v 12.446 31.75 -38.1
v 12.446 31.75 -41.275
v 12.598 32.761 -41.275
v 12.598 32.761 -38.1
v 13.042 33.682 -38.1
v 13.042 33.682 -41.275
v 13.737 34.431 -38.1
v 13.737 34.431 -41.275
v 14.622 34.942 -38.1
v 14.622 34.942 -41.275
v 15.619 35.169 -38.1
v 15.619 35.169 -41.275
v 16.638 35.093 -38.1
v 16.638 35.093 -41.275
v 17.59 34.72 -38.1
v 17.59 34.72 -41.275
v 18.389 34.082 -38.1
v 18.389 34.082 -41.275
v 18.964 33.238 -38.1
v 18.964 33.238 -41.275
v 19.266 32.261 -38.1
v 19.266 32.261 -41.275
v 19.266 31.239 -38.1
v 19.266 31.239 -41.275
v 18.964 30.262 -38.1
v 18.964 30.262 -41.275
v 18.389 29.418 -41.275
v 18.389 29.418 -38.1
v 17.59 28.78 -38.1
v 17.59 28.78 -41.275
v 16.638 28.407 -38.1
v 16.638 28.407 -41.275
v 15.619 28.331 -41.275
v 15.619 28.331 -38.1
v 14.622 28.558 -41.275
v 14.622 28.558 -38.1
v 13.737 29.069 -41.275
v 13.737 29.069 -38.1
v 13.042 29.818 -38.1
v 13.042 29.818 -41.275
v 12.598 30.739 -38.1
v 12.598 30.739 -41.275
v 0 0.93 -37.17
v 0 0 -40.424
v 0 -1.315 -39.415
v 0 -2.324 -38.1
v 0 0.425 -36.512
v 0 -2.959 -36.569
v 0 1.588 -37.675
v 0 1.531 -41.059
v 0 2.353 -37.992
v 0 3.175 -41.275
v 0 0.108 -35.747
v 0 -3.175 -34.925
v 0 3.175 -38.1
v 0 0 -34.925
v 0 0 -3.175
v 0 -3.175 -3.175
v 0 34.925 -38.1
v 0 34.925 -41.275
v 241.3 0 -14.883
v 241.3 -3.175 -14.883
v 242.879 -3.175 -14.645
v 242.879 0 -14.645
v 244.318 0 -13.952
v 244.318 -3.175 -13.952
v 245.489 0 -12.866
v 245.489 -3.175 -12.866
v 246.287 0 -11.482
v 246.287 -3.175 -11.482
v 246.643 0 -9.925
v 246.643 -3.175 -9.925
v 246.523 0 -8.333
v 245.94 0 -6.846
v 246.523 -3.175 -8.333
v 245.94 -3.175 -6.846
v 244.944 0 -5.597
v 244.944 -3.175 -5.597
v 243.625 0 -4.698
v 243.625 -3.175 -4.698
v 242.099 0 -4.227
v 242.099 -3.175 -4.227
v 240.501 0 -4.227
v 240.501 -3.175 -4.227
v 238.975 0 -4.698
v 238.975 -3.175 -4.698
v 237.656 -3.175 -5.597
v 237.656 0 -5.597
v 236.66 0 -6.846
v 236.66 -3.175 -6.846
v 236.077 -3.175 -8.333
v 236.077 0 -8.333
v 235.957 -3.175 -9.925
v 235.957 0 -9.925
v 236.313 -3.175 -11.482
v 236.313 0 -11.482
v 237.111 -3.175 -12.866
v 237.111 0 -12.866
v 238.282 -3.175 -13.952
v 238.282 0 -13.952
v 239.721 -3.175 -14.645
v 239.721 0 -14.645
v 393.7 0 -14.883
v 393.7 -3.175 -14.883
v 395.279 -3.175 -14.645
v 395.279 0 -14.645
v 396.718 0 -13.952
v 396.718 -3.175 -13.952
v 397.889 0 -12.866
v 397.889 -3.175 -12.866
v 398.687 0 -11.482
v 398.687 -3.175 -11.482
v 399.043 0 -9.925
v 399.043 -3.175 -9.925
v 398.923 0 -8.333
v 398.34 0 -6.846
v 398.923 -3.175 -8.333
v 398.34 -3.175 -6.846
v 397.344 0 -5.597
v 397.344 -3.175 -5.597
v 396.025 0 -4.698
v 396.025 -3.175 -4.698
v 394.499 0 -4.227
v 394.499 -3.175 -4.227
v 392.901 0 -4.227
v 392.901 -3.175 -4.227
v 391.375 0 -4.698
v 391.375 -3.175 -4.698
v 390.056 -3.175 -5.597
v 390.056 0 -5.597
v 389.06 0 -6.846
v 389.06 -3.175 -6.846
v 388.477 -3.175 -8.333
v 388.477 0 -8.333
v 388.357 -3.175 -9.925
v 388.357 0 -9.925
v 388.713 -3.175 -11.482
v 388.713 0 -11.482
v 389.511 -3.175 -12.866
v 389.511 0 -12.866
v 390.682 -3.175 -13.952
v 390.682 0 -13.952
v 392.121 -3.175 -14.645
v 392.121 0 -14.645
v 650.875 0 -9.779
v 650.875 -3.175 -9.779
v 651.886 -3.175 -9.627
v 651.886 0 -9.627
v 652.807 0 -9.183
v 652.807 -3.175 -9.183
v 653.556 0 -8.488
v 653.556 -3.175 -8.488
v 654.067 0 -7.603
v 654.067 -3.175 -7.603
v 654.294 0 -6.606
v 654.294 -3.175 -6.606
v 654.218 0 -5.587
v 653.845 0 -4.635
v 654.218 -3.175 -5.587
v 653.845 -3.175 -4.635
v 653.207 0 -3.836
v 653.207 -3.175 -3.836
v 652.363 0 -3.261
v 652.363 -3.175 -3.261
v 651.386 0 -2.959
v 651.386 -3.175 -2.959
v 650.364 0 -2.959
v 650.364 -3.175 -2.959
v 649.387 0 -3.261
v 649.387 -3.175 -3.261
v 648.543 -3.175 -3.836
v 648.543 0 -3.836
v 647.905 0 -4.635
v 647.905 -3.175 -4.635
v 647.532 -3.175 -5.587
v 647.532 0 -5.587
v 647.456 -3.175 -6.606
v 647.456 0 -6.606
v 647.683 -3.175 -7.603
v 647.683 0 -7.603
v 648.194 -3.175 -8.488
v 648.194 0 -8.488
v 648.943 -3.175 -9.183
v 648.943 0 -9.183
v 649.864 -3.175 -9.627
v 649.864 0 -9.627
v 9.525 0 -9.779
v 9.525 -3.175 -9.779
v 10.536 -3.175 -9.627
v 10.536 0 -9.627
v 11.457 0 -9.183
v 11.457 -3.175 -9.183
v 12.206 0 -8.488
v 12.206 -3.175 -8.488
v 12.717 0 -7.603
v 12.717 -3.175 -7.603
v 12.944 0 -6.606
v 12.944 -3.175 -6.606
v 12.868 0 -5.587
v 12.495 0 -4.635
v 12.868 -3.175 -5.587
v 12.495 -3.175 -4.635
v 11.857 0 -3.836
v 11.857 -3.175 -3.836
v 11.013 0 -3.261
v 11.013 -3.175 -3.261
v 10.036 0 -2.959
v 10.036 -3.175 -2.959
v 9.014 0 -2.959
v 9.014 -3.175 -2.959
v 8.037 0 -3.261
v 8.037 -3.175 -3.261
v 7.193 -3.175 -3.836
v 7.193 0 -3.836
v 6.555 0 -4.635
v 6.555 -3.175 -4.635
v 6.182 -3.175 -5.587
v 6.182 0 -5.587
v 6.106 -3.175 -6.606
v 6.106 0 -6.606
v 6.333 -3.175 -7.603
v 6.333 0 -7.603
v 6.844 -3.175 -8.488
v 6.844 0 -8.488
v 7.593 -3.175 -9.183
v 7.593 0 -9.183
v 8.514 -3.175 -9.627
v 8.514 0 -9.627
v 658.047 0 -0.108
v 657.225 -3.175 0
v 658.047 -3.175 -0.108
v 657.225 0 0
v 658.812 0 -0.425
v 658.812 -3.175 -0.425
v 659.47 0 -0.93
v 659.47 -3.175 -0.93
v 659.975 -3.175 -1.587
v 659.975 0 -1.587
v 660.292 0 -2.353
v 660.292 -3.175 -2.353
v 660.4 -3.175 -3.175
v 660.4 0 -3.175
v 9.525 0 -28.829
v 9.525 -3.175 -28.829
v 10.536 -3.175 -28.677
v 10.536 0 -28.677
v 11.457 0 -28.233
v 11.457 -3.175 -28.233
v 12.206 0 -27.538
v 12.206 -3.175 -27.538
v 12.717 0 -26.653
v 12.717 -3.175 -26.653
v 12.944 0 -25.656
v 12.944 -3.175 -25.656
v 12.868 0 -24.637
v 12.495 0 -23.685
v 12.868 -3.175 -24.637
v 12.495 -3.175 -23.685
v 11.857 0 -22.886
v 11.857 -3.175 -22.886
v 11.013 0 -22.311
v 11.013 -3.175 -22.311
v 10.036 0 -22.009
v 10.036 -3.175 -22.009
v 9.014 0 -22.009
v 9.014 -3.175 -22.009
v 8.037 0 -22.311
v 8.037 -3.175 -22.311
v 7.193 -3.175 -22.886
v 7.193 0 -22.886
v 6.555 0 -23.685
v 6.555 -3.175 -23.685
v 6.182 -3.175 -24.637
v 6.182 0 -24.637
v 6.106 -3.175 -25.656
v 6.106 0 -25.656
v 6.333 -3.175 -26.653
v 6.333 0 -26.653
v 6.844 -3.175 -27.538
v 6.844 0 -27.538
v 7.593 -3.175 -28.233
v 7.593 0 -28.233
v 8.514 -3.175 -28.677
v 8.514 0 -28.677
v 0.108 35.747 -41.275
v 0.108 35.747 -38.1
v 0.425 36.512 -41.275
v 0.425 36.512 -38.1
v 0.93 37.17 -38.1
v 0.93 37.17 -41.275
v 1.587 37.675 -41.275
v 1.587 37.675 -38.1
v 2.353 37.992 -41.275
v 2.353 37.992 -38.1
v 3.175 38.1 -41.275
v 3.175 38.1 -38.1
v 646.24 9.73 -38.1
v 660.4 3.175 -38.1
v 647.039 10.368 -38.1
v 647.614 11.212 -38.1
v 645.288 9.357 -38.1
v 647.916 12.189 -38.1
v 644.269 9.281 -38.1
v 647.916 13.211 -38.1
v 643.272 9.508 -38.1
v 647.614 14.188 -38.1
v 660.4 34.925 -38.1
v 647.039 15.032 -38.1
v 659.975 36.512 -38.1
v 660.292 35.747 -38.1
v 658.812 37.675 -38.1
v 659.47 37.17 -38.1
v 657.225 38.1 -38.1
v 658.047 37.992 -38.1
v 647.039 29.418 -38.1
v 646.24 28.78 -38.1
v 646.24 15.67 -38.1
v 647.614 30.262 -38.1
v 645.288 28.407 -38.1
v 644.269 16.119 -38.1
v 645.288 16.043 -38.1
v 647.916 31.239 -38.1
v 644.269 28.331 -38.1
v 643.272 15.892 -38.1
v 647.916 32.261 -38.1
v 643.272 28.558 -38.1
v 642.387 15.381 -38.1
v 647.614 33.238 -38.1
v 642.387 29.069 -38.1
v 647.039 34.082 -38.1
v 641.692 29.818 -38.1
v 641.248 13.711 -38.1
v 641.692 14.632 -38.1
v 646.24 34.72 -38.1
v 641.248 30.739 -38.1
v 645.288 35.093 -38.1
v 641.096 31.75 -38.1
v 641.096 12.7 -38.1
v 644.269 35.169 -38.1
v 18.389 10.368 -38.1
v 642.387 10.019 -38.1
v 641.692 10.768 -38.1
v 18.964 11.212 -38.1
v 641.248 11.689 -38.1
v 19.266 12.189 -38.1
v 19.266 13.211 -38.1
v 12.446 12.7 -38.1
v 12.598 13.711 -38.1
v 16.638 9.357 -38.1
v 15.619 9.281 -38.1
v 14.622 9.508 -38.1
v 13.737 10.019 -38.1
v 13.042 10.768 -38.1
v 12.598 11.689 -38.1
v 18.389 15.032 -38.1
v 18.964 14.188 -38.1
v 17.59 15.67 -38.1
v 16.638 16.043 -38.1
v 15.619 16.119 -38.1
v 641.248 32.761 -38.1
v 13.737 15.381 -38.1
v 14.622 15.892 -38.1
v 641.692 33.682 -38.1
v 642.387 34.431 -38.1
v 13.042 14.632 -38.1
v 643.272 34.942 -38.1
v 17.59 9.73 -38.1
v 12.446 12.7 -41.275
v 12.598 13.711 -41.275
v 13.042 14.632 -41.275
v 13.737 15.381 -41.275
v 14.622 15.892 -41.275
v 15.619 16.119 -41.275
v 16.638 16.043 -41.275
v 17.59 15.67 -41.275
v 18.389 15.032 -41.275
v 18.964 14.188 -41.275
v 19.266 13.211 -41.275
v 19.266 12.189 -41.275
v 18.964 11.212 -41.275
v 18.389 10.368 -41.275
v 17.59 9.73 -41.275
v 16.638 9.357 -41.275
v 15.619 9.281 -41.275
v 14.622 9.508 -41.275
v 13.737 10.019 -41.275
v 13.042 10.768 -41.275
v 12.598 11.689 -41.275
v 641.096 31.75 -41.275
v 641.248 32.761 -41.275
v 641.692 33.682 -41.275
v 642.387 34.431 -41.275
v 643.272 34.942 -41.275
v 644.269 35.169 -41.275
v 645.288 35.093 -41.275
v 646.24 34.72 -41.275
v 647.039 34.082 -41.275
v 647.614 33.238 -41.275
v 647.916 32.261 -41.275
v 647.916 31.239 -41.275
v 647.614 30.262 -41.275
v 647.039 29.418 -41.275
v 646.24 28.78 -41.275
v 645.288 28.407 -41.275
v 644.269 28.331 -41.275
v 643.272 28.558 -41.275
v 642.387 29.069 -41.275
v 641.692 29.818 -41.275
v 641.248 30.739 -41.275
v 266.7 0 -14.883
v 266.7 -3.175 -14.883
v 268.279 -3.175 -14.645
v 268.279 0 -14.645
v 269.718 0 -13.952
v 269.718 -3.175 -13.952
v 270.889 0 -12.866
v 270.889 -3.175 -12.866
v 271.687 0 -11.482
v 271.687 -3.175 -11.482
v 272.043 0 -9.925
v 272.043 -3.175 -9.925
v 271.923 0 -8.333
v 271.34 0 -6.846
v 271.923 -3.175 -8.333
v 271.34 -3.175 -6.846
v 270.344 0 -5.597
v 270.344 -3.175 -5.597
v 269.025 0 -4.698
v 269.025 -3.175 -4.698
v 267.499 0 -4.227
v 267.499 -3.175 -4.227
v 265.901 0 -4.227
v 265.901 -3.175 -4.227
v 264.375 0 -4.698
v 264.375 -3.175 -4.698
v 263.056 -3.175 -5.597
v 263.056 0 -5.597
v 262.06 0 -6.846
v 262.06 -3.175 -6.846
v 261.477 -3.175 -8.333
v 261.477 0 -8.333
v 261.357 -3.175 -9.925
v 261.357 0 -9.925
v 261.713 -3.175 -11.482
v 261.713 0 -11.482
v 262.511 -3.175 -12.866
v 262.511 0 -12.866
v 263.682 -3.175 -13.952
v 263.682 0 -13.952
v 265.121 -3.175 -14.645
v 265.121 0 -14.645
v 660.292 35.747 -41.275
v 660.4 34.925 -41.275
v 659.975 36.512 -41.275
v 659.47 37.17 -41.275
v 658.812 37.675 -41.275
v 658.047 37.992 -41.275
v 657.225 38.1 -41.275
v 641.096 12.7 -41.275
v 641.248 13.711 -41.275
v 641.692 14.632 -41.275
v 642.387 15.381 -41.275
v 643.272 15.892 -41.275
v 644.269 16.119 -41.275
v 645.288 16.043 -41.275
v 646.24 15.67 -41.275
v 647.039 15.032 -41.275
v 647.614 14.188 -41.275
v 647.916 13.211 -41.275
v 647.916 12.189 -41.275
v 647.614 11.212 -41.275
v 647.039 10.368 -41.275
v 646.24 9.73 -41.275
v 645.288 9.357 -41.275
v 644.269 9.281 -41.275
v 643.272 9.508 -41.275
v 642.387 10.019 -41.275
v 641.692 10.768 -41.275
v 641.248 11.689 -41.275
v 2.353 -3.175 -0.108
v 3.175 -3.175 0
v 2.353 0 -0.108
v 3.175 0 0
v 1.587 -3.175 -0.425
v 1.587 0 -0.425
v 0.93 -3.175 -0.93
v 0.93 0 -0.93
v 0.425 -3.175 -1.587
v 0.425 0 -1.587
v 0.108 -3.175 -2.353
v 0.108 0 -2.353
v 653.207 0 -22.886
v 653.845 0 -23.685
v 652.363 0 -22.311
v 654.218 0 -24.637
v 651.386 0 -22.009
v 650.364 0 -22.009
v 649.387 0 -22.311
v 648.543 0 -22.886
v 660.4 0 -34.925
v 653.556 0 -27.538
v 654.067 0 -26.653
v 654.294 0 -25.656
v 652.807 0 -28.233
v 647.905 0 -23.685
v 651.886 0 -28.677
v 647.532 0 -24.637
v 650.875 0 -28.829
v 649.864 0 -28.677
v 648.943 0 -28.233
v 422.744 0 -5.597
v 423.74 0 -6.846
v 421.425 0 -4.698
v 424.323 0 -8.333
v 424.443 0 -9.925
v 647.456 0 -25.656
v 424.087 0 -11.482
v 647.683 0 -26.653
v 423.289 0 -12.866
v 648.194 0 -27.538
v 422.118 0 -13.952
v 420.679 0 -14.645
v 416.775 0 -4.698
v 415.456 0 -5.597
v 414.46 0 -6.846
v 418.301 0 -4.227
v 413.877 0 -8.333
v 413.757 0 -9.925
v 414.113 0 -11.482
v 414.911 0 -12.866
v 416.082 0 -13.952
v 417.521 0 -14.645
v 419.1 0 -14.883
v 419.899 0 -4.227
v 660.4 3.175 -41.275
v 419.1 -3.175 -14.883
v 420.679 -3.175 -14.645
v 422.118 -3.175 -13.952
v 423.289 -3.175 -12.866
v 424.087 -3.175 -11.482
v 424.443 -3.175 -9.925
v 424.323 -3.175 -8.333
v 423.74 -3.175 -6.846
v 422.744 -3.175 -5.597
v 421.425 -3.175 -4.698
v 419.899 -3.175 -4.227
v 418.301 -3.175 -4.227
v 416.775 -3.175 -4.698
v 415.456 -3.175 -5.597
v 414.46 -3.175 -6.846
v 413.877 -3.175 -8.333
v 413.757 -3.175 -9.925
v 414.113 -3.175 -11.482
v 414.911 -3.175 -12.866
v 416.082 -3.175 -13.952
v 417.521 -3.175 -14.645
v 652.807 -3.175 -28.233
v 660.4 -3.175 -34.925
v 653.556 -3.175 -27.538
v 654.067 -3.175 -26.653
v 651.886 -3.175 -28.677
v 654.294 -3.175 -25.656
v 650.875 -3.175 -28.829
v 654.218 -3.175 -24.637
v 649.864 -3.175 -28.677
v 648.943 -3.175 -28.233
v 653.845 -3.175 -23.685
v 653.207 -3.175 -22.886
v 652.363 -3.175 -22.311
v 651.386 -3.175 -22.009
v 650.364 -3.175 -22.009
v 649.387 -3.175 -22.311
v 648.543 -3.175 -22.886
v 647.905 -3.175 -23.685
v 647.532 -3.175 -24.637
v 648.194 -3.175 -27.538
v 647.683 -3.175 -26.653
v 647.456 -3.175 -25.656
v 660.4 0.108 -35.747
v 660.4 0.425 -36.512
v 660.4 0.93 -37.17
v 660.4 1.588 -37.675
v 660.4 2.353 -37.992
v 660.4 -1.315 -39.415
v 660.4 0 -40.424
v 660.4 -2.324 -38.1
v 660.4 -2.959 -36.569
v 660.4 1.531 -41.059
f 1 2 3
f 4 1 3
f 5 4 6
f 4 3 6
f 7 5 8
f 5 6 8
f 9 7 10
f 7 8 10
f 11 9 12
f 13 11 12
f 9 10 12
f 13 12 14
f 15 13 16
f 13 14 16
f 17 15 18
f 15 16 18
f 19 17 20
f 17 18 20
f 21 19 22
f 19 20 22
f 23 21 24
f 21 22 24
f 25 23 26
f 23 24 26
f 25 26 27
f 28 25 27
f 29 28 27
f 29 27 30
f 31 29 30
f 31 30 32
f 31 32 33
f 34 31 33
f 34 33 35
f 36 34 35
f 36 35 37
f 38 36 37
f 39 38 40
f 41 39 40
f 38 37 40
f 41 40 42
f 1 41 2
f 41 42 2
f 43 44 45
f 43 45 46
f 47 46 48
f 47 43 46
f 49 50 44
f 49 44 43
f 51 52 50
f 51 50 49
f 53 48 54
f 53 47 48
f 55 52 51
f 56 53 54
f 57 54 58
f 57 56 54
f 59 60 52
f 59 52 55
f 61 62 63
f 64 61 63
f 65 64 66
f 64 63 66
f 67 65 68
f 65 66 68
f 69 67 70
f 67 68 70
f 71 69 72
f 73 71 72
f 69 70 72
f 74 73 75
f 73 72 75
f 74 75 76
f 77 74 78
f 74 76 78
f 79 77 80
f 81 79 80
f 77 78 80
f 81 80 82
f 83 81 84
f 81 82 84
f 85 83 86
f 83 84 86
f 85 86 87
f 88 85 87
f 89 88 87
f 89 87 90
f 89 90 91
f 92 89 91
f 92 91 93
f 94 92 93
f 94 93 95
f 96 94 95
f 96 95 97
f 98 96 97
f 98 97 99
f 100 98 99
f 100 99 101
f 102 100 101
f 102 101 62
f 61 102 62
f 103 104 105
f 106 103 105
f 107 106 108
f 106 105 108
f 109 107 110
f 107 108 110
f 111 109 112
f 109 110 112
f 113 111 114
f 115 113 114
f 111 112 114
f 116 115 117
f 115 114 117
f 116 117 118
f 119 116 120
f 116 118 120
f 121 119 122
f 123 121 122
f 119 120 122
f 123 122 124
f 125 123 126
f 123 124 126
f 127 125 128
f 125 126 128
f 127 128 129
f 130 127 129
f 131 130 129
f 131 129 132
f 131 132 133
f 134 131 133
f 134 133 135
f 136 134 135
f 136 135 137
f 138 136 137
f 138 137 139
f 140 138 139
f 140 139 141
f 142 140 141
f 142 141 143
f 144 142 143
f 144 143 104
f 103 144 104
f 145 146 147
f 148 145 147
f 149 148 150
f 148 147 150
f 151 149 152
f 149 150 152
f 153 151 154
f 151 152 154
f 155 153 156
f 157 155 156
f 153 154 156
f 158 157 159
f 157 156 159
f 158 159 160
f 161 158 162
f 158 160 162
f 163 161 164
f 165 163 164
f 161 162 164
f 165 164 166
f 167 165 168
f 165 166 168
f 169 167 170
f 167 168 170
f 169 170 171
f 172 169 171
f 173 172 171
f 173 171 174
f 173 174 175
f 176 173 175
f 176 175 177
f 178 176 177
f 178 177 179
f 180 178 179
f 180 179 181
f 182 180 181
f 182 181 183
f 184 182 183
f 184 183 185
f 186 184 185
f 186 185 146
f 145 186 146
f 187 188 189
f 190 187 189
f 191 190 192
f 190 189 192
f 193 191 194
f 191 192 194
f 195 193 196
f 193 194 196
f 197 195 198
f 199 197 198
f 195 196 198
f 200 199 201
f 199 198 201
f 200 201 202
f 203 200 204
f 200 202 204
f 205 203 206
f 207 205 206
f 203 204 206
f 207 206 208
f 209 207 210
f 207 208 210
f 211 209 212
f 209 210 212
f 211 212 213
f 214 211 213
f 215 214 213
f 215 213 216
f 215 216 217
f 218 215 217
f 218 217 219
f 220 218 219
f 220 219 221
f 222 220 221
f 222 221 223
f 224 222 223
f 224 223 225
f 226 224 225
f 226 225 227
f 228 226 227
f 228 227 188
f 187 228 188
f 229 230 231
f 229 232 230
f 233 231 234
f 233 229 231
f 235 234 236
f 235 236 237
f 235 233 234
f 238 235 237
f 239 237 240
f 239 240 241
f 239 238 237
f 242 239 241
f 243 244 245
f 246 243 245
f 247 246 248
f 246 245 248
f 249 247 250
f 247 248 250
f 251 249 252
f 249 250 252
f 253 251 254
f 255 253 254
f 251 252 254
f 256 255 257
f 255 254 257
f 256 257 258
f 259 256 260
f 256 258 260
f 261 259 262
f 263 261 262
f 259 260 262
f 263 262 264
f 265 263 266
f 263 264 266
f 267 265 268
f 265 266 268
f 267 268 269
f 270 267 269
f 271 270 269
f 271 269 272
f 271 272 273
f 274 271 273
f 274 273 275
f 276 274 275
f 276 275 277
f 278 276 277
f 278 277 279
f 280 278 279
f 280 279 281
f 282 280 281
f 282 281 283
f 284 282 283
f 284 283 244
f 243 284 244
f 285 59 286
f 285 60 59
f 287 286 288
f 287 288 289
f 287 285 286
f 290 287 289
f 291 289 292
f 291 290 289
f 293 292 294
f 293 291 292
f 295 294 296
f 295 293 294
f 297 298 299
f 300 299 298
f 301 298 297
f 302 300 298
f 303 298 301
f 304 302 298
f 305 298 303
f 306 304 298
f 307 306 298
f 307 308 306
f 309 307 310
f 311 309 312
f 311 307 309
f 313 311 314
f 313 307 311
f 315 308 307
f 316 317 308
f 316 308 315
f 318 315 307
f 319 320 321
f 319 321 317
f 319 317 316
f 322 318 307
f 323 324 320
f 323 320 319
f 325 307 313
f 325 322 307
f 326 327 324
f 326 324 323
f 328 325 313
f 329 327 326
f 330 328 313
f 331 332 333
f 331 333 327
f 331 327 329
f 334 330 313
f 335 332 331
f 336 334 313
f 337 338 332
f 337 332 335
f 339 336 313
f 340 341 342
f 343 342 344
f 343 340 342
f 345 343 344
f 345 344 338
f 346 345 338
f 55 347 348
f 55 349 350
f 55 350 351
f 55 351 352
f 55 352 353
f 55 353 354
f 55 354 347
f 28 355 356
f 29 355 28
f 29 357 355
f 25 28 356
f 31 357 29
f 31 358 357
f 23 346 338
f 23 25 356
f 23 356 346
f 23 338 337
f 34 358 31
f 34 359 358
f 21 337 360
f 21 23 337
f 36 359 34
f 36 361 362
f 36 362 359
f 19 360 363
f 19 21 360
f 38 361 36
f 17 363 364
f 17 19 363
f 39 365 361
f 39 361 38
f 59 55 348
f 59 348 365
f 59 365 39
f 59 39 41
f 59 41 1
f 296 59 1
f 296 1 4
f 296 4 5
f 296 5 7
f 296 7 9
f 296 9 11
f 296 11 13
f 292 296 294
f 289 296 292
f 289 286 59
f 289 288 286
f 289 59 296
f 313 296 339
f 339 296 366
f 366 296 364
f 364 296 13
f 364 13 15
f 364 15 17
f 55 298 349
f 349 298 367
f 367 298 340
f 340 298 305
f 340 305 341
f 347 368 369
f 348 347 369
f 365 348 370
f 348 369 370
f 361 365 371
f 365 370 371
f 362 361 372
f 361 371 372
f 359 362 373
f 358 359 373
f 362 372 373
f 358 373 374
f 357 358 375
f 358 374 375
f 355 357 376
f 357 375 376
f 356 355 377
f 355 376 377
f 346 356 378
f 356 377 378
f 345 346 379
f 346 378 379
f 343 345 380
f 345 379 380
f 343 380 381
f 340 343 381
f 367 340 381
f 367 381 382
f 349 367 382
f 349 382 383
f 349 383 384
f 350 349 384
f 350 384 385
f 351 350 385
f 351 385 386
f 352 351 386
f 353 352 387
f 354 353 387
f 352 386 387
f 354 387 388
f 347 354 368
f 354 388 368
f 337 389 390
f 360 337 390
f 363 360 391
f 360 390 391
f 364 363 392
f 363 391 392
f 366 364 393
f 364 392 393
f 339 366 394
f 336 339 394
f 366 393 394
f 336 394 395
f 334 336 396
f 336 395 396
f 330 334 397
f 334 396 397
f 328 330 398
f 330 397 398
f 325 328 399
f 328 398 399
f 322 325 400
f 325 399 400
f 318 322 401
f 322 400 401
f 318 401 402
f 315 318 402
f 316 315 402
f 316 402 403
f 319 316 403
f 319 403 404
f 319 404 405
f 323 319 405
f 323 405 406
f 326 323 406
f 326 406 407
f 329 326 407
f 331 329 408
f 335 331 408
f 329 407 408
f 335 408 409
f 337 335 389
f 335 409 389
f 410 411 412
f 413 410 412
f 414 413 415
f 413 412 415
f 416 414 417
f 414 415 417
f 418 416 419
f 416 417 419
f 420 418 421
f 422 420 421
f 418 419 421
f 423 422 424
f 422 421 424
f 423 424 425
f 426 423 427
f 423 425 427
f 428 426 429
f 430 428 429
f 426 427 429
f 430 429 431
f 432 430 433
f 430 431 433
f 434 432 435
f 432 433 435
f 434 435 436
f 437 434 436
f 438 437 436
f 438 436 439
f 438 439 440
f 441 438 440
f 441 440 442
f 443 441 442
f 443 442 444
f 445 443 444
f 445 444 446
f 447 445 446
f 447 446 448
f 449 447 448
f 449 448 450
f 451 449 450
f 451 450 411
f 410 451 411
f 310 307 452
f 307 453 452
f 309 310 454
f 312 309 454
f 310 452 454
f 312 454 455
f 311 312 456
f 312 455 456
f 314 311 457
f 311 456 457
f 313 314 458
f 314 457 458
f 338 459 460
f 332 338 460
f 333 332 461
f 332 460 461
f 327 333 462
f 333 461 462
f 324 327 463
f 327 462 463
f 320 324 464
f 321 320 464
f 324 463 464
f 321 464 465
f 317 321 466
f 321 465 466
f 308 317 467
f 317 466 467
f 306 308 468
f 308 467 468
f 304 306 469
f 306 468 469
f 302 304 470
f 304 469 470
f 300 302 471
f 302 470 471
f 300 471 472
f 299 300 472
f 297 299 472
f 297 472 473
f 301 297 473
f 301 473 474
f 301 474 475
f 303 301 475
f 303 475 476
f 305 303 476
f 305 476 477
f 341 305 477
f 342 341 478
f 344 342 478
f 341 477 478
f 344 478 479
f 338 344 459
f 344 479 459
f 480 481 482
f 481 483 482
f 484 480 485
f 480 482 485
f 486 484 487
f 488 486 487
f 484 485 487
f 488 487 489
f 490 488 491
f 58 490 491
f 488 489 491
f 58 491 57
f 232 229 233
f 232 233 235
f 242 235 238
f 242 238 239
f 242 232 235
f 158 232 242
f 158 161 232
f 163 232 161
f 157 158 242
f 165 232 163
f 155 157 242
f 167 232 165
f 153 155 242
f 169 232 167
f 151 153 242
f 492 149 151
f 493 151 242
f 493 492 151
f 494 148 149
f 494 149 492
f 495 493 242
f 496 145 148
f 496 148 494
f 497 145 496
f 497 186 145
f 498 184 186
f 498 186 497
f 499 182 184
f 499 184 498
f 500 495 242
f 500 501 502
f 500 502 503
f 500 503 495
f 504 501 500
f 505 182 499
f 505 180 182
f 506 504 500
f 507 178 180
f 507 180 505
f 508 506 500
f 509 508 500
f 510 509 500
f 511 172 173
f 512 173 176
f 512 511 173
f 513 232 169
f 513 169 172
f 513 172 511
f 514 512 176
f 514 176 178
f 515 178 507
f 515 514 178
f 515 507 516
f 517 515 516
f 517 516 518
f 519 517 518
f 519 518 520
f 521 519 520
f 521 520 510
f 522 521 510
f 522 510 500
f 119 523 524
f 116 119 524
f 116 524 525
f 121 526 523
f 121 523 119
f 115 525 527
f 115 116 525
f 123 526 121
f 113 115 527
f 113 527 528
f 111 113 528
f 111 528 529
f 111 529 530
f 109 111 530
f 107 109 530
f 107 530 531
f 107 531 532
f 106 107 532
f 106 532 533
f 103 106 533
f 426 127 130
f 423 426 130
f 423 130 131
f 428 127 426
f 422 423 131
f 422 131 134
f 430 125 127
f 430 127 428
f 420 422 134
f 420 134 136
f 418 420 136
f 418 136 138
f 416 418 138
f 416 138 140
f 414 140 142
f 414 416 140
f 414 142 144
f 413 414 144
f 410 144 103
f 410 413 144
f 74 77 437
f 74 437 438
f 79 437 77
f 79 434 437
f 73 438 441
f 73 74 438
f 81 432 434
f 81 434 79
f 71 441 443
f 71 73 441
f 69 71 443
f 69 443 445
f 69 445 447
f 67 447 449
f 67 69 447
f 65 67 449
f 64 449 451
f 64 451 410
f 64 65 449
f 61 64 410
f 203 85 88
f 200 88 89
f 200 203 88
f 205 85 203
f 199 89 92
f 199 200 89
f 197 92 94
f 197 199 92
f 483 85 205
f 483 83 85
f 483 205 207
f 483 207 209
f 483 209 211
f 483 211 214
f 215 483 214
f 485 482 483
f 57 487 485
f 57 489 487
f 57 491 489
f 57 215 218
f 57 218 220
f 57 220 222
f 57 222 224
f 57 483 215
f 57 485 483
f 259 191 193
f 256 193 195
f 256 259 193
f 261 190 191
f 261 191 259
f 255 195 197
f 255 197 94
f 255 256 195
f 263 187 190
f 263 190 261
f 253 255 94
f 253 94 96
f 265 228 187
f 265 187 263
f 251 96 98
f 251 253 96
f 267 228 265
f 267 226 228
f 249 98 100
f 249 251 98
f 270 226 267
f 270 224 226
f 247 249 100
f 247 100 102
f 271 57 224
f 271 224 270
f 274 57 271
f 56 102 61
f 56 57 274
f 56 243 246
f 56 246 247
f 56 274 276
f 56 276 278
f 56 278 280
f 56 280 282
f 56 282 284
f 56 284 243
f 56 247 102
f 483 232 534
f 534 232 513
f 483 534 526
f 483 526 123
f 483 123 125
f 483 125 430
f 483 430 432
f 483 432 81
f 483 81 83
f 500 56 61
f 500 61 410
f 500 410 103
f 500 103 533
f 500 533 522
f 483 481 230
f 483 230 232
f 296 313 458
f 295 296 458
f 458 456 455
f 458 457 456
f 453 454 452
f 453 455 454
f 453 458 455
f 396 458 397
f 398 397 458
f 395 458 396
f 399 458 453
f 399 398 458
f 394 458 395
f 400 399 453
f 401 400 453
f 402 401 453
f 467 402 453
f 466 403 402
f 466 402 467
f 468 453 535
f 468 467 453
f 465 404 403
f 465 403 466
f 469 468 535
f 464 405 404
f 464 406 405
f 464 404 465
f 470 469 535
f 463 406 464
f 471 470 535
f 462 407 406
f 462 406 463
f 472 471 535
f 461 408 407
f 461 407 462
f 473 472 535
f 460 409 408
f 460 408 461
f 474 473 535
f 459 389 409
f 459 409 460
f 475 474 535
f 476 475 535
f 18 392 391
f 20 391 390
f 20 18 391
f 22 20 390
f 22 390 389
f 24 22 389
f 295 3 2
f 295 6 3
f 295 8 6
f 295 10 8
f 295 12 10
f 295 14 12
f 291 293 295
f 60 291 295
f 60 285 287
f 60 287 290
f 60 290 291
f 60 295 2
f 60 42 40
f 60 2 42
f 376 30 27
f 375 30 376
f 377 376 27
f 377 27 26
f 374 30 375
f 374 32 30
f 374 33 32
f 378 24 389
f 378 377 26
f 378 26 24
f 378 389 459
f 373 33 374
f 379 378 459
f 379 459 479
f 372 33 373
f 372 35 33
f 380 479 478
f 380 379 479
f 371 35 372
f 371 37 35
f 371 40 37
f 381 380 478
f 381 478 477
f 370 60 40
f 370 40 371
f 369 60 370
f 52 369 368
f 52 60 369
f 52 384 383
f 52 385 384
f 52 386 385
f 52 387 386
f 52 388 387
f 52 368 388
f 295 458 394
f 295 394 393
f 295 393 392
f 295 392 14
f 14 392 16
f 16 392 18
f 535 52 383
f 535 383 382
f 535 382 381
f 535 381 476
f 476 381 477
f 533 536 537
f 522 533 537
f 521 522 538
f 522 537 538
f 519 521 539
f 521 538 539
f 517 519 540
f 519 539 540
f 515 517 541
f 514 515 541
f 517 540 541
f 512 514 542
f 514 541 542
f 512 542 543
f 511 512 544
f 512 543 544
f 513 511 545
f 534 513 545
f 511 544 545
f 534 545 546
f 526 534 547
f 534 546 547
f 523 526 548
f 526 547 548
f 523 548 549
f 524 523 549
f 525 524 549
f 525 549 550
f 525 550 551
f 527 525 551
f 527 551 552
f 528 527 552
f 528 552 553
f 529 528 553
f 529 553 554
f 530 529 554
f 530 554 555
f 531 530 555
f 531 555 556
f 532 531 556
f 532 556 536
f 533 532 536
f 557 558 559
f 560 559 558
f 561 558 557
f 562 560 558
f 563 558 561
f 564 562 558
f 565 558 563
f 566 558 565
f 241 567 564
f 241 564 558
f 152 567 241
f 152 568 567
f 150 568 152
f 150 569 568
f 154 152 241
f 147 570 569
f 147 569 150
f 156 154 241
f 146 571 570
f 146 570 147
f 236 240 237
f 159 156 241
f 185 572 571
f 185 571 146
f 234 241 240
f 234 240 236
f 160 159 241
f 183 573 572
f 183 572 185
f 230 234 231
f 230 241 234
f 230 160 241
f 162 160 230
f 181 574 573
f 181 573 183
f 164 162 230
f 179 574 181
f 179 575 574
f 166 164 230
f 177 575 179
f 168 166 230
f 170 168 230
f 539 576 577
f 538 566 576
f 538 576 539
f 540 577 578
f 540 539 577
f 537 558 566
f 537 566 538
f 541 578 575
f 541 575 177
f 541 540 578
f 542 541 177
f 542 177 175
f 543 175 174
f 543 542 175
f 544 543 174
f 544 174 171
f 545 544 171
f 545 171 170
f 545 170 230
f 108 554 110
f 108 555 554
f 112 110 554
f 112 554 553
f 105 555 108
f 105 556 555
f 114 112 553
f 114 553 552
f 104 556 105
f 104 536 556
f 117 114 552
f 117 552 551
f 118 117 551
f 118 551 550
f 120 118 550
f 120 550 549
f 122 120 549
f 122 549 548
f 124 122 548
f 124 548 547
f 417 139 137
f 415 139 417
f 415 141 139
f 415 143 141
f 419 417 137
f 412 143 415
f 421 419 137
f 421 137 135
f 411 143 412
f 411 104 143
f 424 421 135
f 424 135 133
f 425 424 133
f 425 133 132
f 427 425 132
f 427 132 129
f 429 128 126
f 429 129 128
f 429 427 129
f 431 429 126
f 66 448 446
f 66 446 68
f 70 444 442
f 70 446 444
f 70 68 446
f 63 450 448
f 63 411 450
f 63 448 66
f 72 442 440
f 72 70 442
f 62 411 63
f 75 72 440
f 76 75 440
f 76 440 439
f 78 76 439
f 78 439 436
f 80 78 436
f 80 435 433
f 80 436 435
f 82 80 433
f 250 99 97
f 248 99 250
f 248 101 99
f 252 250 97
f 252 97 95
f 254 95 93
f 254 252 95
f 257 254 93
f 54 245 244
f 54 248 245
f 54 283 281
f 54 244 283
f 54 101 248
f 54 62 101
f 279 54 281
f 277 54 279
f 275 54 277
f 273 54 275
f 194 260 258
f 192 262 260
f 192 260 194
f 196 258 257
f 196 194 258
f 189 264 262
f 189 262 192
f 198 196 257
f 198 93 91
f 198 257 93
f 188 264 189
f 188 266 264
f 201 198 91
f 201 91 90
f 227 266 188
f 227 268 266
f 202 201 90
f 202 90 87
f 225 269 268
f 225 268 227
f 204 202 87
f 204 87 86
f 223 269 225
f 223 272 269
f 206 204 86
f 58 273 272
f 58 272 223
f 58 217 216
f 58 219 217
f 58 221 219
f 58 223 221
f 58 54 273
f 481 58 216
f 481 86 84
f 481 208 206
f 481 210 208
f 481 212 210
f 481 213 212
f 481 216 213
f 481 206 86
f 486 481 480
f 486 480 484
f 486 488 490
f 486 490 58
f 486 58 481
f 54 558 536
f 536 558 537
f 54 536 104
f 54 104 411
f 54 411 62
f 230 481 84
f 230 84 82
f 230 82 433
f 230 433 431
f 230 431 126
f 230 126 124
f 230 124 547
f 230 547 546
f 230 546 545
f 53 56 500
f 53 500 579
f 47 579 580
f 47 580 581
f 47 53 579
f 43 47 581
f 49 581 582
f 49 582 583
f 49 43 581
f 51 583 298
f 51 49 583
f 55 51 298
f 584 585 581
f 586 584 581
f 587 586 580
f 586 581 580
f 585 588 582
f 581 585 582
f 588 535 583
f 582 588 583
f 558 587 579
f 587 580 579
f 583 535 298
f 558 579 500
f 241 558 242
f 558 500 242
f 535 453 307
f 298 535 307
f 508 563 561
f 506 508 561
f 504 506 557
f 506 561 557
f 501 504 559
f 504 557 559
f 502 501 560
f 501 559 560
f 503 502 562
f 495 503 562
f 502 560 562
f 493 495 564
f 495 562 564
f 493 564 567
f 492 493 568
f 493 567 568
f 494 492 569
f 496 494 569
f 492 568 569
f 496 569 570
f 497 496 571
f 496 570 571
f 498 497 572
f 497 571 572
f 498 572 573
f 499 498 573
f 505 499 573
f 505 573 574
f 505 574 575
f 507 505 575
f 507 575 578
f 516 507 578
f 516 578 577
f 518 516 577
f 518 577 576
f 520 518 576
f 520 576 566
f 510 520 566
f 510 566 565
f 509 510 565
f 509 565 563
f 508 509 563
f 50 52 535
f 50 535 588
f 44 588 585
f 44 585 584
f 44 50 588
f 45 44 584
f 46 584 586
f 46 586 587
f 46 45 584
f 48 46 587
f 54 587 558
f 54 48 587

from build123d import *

# Parameters (mm, degrees)
BASE_FLANGE1_DEPTH = 660.4
SKETCH3_R          = 3.429
SKETCH3_R_2        = 5.3578125
CUT_EXTRUDE2_DEPTH = 6.35
FILLET1_R          = 3.175
SKETCH4_R          = 3.429
CUT_EXTRUDE3_DEPTH = 3.175


# Sheet-metal steps are written as plain solids
with BuildPart() as part:
    # Sketch1 → Base-Flange1 (new body)
    with BuildSketch(Plane(origin=(0, 0, 0), x_dir=(0, 0, -1), z_dir=(1, 0, 0))):
        with BuildLine():
            Line((0, 0), (34.925, 0))
            ThreePointArc((34.925, 0), (37.17006403, 0.92993597), (38.1, 3.175))
            Line((38.1, 3.175), (38.1, 38.1))
            Line((38.1, 38.1), (41.275, 38.1))
            Line((41.275, 38.1), (41.275, 3.175))
            ThreePointArc((41.275, 3.175), (39.415128061, -1.315128061), (34.925, -3.175))
            Line((34.925, -3.175), (0, -3.175))
            Line((0, -3.175), (0, 0))
        make_face()
    extrude(amount=BASE_FLANGE1_DEPTH)

    # Sketch3 → Cut-Extrude2 (cut)
    with BuildSketch(Plane.XZ.offset(3.175)):
        with Locations(Location((9.525, -25.4, 0), (0, 0, 270))):
            Circle(SKETCH3_R)
        with Locations(Location((9.525, -6.35, 0), (0, 0, 270))):
            Circle(SKETCH3_R)
        with Locations(Location((650.875, -25.4, 0), (0, 0, 270))):
            Circle(SKETCH3_R)
        with Locations(Location((650.875, -6.35, 0), (0, 0, 270))):
            Circle(SKETCH3_R)
        with Locations(Location((241.3, -9.525, 0), (0, 0, 270))):
            Circle(SKETCH3_R_2)
        with Locations(Location((419.1, -9.525, 0), (0, 0, 270))):
            Circle(SKETCH3_R_2)
        with Locations(Location((266.7, -9.525, 0), (0, 0, 270))):
            Circle(SKETCH3_R_2)
        with Locations(Location((393.7, -9.525, 0), (0, 0, 270))):
            Circle(SKETCH3_R_2)
    extrude(amount=-CUT_EXTRUDE2_DEPTH, mode=Mode.SUBTRACT)

    # Fillet1
    fillet1_edges = [part.edges().sort_by_distance(p)[0] for p in [
        (660.4, -1.5875, 0),
        (0, -1.5875, 0),
        (660.4, 38.1, -39.6875),
        (0, 38.1, -39.6875),
    ]]
    fillet(fillet1_edges, radius=FILLET1_R)

    # Sketch4 → Cut-Extrude3 (cut)
    with BuildSketch(Plane(origin=(0, 0, -41.275), x_dir=(-1, 0, 0), z_dir=(0, 0, -1))):
        with Locations((-644.525, 31.75)):
            Circle(SKETCH4_R)
        with Locations((-644.525, 12.7)):
            Circle(SKETCH4_R)
        with Locations((-15.875, 31.75)):
            Circle(SKETCH4_R)
        with Locations((-15.875, 12.7)):
            Circle(SKETCH4_R)
    extrude(amount=-CUT_EXTRUDE3_DEPTH, mode=Mode.SUBTRACT)


solid = part.part
